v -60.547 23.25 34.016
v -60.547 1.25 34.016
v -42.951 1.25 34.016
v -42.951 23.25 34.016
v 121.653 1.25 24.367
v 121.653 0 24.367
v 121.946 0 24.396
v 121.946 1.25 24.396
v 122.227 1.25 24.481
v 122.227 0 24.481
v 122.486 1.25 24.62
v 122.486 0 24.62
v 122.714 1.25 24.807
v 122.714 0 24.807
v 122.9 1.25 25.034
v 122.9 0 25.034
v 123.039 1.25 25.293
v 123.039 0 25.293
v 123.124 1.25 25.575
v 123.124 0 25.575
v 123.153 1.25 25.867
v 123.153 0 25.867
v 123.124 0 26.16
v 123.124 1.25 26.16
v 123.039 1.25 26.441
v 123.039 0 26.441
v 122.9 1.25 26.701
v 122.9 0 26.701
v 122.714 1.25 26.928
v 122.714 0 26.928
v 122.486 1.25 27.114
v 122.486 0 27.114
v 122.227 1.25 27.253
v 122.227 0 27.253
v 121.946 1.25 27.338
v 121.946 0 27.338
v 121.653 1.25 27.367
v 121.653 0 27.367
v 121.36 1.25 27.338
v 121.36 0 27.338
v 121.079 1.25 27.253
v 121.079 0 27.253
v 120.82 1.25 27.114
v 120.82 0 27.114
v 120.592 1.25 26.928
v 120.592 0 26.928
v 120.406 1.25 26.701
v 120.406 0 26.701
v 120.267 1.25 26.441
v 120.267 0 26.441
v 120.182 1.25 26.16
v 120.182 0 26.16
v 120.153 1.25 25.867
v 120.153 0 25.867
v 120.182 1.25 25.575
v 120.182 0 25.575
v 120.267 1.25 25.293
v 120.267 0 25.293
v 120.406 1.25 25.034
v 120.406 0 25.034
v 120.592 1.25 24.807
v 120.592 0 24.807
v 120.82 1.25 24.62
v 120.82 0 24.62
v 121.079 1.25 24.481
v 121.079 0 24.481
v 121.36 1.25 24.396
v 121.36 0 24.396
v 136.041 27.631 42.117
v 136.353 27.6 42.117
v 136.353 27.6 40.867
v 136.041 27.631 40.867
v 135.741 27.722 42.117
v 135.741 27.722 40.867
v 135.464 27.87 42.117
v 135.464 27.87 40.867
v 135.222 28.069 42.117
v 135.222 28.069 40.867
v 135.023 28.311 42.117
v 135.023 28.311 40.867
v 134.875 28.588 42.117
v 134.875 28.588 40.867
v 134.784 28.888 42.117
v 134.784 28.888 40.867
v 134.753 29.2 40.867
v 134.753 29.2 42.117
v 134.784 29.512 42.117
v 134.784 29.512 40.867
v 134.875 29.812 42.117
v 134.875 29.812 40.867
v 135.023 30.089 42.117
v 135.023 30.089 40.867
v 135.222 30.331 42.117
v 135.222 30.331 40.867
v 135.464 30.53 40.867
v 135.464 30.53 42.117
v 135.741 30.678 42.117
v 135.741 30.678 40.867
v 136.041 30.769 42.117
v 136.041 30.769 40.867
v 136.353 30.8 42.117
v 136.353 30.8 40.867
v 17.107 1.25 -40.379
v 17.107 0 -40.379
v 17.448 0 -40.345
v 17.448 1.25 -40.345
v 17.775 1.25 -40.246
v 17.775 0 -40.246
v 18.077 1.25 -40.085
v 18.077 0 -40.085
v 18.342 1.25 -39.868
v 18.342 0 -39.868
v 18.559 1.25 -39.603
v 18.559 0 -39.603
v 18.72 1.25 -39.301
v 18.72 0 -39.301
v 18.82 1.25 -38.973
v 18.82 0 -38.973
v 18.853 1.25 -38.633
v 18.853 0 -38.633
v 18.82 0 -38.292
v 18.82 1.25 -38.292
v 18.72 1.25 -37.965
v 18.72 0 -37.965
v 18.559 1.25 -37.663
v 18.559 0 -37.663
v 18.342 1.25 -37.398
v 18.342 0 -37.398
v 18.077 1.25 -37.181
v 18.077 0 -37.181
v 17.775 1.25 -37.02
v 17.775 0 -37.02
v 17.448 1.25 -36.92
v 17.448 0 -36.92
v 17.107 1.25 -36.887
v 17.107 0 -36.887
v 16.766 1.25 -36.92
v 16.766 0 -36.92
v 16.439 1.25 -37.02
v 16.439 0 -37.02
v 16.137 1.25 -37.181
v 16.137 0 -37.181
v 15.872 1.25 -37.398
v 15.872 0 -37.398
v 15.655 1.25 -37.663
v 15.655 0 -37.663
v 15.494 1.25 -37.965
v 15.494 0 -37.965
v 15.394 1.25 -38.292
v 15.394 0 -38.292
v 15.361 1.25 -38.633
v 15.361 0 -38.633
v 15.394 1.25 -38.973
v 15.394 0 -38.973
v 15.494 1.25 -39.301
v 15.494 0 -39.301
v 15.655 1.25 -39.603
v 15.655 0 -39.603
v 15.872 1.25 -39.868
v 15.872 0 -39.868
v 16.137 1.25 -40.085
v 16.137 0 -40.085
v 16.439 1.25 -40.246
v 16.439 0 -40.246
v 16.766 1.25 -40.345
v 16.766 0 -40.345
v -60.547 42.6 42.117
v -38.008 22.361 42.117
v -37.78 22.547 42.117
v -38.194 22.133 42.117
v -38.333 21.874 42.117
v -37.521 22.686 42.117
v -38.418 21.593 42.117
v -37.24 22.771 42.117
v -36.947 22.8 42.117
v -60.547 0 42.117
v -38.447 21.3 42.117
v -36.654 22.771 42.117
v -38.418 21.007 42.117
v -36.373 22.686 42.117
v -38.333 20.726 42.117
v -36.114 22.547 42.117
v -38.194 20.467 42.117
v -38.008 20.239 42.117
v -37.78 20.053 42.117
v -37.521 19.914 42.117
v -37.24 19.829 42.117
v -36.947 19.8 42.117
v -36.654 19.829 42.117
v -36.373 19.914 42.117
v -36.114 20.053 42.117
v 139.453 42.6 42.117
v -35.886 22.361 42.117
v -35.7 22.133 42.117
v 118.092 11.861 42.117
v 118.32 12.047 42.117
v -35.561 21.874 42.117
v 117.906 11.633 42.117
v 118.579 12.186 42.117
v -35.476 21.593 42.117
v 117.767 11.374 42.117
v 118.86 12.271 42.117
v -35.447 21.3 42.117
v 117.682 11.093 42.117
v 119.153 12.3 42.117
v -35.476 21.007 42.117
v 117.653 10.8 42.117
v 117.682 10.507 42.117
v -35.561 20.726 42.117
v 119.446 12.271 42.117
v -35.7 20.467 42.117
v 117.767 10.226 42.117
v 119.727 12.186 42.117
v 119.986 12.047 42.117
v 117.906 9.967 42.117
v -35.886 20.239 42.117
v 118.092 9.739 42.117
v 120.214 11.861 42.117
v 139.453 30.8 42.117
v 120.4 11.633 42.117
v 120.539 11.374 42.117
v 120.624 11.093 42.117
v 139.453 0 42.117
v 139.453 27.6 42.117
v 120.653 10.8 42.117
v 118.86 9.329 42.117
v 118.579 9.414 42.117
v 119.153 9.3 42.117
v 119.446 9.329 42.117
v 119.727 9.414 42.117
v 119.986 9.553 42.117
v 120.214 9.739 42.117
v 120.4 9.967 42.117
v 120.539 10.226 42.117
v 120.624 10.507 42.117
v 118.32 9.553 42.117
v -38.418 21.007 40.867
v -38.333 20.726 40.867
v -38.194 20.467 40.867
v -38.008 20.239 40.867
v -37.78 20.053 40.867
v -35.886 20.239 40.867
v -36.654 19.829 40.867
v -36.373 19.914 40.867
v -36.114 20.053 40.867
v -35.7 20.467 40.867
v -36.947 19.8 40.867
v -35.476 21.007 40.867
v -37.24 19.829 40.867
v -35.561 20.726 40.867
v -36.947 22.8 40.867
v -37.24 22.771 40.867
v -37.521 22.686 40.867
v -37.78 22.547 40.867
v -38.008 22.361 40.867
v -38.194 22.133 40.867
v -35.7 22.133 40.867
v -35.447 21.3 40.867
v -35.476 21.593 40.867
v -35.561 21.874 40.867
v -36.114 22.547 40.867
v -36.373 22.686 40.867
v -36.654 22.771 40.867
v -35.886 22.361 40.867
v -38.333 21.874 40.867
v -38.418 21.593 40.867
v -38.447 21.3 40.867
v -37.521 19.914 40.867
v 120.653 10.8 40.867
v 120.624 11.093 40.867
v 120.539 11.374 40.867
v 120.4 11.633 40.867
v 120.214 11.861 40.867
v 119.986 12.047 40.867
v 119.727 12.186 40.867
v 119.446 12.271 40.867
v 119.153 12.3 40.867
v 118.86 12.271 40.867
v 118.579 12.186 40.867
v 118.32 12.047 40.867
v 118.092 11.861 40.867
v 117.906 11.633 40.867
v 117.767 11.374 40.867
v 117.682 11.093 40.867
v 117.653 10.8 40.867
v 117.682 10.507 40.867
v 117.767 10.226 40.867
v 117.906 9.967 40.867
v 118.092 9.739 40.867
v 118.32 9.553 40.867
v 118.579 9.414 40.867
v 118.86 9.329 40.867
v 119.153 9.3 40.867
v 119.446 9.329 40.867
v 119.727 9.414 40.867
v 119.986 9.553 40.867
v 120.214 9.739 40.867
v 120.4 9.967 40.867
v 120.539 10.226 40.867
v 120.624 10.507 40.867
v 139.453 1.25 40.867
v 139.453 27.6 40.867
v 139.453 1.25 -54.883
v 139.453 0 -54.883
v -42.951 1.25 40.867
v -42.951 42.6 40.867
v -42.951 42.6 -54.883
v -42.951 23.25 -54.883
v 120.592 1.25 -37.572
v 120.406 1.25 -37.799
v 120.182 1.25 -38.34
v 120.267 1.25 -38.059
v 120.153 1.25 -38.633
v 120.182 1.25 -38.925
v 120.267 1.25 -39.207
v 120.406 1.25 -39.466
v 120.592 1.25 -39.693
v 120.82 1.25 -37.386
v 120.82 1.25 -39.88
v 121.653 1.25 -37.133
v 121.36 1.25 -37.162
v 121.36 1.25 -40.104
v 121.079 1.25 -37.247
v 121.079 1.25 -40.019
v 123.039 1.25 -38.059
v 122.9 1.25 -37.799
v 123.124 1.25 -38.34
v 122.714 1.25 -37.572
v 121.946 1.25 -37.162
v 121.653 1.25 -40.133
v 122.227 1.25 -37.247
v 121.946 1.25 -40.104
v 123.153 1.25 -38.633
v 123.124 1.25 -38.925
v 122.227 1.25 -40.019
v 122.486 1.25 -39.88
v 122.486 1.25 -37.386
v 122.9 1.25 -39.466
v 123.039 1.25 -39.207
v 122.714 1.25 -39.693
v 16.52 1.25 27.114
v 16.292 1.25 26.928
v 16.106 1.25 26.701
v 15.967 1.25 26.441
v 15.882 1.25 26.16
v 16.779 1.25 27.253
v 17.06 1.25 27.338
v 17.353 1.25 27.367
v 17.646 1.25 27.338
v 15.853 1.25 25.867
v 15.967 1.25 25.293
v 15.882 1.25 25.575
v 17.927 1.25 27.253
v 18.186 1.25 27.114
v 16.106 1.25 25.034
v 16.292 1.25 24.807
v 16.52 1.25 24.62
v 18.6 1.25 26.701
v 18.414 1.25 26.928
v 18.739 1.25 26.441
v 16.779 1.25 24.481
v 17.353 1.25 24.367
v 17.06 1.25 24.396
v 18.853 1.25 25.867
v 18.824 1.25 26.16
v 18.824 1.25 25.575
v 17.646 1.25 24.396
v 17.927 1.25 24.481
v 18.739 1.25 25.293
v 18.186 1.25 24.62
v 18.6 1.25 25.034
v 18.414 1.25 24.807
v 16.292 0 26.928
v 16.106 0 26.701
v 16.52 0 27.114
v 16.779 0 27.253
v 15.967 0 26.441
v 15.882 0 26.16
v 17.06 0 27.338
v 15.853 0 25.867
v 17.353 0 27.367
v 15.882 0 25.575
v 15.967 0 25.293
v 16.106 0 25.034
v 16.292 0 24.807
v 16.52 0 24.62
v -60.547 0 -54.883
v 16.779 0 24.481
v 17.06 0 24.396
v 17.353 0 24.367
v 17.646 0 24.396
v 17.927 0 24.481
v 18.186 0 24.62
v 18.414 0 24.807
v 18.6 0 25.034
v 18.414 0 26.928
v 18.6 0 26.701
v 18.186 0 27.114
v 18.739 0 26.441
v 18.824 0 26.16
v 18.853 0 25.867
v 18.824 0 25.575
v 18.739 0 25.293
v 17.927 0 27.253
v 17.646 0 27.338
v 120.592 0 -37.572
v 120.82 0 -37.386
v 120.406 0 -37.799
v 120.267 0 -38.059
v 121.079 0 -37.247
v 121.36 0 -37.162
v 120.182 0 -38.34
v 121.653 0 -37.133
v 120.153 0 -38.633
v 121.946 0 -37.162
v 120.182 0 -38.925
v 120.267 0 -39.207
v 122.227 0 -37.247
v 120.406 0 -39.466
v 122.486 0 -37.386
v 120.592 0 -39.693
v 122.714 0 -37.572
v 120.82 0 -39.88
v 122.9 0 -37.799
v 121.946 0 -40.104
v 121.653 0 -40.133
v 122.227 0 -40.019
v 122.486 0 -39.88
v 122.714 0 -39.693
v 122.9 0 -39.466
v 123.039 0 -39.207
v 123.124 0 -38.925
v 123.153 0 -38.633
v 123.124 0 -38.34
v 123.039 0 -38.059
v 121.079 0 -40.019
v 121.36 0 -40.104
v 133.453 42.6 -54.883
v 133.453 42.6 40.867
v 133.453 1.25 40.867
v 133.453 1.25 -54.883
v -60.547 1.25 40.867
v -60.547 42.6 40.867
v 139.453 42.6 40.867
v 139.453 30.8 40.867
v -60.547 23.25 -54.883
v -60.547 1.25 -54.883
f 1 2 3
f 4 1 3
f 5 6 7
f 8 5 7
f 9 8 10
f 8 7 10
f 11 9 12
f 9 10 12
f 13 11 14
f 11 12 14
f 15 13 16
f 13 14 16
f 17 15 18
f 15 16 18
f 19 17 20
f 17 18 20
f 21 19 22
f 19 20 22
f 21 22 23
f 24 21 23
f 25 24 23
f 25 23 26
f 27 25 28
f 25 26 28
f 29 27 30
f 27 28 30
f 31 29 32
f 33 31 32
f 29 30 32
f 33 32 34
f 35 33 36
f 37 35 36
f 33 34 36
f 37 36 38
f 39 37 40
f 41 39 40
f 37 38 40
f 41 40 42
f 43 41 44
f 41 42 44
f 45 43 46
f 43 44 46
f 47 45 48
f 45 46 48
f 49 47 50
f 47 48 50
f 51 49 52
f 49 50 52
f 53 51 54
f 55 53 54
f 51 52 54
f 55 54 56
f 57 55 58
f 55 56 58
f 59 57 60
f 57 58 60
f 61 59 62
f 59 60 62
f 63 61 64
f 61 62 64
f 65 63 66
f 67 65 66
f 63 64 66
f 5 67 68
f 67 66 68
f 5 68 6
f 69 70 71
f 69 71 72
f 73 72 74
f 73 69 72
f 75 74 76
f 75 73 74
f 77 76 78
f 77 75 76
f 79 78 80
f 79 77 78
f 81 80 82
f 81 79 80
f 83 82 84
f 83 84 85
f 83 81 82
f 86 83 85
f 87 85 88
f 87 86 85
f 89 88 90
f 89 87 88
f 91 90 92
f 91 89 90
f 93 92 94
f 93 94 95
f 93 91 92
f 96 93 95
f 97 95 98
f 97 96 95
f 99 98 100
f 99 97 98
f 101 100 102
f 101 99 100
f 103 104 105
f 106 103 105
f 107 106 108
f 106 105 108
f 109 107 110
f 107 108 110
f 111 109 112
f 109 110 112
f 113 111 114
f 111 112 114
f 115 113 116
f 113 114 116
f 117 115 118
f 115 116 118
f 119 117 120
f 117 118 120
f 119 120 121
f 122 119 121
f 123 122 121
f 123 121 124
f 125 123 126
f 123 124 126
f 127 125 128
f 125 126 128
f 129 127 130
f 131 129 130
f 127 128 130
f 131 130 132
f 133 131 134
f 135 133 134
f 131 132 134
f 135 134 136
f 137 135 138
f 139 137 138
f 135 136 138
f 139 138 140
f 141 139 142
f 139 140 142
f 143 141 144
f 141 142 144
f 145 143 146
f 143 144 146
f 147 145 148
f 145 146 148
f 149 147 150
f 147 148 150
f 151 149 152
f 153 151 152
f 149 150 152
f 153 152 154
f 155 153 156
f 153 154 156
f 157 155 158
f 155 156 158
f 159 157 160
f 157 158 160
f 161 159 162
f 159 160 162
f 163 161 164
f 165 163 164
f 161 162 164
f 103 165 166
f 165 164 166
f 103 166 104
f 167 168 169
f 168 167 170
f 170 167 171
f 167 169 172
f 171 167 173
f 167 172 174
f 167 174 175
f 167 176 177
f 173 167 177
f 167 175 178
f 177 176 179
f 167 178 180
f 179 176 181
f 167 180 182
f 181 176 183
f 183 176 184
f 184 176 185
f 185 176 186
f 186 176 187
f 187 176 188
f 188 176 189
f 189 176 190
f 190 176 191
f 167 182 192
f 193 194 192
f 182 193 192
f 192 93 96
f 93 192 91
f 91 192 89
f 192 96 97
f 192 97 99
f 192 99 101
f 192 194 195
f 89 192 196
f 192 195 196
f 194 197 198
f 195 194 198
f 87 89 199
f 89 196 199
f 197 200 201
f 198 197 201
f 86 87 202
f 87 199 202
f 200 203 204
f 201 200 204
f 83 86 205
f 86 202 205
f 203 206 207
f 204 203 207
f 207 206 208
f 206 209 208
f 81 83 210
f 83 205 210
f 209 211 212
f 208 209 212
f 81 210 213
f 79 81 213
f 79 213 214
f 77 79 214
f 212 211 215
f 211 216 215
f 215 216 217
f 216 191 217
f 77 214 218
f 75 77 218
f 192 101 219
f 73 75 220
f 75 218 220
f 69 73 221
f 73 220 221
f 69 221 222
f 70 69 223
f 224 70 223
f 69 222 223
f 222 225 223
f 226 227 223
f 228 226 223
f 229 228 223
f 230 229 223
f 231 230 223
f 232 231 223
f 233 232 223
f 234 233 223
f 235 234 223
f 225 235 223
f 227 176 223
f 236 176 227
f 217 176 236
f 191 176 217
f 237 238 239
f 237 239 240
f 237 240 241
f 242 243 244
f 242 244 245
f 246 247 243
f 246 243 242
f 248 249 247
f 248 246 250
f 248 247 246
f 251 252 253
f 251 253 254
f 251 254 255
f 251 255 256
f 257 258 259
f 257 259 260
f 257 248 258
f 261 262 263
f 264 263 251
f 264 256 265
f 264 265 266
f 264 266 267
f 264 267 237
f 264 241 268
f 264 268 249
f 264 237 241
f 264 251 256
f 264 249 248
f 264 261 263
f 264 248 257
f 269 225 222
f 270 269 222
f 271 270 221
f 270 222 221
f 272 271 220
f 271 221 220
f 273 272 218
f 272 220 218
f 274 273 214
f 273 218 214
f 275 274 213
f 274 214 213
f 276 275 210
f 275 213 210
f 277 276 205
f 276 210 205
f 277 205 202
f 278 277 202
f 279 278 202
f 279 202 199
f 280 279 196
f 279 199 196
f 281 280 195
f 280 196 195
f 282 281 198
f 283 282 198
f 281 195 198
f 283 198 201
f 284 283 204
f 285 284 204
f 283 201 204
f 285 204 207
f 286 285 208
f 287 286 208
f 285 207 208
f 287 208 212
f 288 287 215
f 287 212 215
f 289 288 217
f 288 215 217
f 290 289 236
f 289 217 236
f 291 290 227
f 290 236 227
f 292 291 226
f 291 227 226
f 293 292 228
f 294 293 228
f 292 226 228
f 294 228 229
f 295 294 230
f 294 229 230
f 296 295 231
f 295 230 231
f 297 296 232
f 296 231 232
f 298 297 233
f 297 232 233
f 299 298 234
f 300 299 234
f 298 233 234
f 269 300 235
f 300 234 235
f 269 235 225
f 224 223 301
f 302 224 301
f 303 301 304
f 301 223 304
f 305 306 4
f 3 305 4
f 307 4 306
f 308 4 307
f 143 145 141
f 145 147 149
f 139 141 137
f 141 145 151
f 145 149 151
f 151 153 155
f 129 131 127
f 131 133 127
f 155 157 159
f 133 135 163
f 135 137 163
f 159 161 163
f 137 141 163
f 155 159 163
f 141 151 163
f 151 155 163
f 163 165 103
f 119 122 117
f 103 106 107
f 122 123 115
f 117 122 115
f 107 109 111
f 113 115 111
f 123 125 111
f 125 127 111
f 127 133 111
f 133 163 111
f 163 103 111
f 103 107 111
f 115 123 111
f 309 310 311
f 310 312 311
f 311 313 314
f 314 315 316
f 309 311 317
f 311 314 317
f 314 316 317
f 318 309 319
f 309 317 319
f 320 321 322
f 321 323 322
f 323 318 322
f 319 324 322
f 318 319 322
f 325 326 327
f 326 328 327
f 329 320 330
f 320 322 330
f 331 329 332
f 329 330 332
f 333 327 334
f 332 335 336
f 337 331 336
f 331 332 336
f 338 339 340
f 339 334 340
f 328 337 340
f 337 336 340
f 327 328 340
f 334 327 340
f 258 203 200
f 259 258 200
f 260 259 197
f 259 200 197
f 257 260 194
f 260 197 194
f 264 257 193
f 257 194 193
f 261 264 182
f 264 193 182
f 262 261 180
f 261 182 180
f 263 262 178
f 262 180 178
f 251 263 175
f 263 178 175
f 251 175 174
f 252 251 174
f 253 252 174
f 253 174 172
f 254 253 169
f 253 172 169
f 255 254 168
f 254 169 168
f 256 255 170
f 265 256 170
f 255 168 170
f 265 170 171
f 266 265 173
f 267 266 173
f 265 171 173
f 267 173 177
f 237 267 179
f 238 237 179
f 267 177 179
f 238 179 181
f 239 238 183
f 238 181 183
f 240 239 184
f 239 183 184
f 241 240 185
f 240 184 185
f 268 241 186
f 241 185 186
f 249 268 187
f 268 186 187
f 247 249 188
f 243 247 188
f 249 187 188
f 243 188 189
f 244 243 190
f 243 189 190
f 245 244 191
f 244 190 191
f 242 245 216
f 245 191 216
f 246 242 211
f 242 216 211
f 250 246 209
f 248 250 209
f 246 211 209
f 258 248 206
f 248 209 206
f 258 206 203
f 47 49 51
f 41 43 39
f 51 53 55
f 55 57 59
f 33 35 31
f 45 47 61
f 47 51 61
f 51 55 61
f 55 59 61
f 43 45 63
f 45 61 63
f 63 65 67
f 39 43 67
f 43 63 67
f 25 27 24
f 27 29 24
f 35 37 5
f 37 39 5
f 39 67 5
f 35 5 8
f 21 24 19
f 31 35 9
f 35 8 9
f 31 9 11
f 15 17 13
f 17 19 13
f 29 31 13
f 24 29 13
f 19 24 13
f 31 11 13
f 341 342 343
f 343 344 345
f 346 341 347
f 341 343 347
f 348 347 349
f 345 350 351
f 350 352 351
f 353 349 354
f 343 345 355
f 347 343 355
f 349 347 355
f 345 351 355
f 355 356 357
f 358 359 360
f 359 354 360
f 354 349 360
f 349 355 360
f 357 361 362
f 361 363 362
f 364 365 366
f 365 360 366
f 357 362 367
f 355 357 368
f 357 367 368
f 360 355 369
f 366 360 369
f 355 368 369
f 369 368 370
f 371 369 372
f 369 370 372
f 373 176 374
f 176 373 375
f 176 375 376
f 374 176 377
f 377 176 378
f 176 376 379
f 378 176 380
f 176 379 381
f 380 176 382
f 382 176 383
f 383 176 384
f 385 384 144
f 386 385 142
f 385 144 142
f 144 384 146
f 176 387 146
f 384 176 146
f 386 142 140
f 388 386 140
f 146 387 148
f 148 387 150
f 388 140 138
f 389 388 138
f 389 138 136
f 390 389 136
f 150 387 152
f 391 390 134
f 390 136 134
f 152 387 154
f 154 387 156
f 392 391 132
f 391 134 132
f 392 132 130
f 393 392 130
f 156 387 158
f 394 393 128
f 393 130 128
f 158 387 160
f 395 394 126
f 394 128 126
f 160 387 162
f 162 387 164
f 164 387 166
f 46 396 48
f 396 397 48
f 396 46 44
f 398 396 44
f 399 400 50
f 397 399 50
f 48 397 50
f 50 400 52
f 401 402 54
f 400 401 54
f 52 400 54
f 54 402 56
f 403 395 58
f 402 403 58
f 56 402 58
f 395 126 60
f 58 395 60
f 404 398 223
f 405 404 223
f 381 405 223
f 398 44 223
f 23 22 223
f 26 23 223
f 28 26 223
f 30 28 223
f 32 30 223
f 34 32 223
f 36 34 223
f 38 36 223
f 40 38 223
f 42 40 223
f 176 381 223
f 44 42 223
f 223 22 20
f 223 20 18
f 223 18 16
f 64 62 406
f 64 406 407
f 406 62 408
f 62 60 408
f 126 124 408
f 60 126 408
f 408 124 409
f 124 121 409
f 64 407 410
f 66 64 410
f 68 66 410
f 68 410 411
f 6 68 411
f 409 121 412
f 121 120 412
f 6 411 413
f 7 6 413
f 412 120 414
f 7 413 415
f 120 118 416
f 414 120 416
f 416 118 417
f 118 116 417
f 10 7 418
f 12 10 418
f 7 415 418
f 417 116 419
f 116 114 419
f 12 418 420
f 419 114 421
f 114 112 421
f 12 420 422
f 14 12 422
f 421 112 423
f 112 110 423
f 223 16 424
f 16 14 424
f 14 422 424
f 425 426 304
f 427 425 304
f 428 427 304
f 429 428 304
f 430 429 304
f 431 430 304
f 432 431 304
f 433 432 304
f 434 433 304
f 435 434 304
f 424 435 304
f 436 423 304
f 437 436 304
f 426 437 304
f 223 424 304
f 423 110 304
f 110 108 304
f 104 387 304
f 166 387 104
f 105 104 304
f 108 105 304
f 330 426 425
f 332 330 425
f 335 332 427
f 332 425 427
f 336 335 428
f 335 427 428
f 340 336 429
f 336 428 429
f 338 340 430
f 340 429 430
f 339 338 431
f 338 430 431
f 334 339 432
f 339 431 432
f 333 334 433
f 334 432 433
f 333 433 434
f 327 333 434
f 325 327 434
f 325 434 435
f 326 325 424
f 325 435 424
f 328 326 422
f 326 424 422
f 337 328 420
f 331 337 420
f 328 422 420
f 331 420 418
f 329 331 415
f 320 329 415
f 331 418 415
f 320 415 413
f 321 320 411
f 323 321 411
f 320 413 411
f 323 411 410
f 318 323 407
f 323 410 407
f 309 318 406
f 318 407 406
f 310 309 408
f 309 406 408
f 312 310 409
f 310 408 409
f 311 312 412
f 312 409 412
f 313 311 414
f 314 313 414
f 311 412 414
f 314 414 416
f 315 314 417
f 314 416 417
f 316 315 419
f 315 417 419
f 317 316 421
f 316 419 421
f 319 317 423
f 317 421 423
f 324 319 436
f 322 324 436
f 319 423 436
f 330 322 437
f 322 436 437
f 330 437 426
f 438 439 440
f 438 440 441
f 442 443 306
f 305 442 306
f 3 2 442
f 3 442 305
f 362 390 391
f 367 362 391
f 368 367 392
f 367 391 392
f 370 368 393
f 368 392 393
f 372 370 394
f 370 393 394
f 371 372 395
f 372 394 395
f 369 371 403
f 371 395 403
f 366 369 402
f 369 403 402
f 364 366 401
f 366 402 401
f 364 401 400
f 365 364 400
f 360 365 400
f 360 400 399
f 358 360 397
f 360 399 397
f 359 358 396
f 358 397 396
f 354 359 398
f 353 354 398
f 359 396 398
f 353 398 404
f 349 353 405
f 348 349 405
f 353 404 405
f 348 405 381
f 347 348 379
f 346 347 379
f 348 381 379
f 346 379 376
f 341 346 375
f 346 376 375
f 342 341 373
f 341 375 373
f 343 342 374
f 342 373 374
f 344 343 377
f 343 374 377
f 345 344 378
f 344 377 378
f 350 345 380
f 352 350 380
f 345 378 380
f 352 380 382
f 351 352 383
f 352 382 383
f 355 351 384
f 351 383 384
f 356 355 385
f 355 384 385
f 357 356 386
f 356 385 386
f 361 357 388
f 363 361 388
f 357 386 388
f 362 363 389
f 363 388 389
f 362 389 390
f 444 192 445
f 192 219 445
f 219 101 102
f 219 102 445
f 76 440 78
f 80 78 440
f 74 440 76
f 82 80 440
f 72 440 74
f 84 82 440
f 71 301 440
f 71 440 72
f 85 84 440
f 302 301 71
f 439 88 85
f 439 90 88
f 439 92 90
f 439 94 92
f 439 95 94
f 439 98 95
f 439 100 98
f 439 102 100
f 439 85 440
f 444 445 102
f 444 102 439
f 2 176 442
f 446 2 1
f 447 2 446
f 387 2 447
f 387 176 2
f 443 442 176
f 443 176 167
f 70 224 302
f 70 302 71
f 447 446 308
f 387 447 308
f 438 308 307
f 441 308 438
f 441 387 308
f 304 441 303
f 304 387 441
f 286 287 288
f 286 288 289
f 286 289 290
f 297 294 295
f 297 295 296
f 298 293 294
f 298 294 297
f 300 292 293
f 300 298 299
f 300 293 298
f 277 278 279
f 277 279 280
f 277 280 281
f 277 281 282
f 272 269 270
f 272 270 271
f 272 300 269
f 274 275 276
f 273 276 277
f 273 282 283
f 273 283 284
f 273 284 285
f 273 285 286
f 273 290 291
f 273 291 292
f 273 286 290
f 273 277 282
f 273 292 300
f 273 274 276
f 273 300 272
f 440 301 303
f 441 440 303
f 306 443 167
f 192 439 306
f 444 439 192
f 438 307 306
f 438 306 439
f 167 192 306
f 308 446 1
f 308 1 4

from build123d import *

# Parameters (mm, degrees)
SZKIC1_W                    = 200
SZKIC1_H                    = 97
DODANIE_WYCI_GNI_CIE1_DEPTH = 1.25
SZKIC2_W                    = 200
SZKIC2_H                    = 1.25
DODANIE_WYCI_GNI_CIE2_DEPTH = 42.6
SZKIC4_R                    = 1.5
SZKIC4_R_2                  = 1.746235722
WYTNIJ_WYCI_GNI_CIE1_DEPTH  = 1.25
SZKIC5_W                    = 182.404557989
SZKIC5_H                    = 95.75
DODANIE_WYCI_GNI_CIE3_DEPTH = 41.35
SZKIC6_W                    = 17.595442011
SZKIC6_H                    = 88.898428246
DODANIE_WYCI_GNI_CIE4_DEPTH = 22
SZKIC3_R                    = 1.5
WYTNIJ_WYCI_GNI_CIE2_DEPTH  = 1.25
SZKIC7_W                    = 95.75
SZKIC7_H                    = 41.35
WYTNIJ_WYCI_GNI_CIE3_DEPTH  = 6


with BuildPart() as part:
    # Szkic1 → Dodanie-wyciągnięcie1 (new body)
    with BuildSketch(Plane(origin=(0, 0, 0), x_dir=(1, 0, 0), z_dir=(0, 1, 0))):
        with Locations((39.453125, 6.3828125)):
            Rectangle(SZKIC1_W, SZKIC1_H)
    extrude(amount=DODANIE_WYCI_GNI_CIE1_DEPTH)

    # Szkic2 → Dodanie-wyciągnięcie2 (add)
    with BuildSketch(Plane.XZ):
        with Locations((39.453125, 41.4921875)):
            Rectangle(SZKIC2_W, SZKIC2_H)
    extrude(amount=-DODANIE_WYCI_GNI_CIE2_DEPTH)

    # Szkic4 → Wytnij-wyciągnięcie1 (cut)
    with BuildSketch(Plane.XZ):
        with Locations(Location((121.653125, -38.6328125, 0), (0, 0, 270))):
            Circle(SZKIC4_R)
        with Locations(Location((121.653125, 25.8671875, 0), (0, 0, 270))):
            Circle(SZKIC4_R)
        with Locations(Location((17.106889278, -38.6328125, 0), (0, 0, 270))):
            Circle(SZKIC4_R_2)
        with Locations(Location((17.353125, 25.8671875, 0), (0, 0, 270))):
            Circle(SZKIC4_R)
    extrude(amount=-WYTNIJ_WYCI_GNI_CIE1_DEPTH, mode=Mode.SUBTRACT)

    # Szkic5 → Dodanie-wyciągnięcie3 (add)
    with BuildSketch(Plane(origin=(0, 1.25, 0), x_dir=(1, 0, 0), z_dir=(0, 1, 0))):
        with Locations((48.250846005, 7.0078125)):
            Rectangle(SZKIC5_W, SZKIC5_H)
    extrude(amount=DODANIE_WYCI_GNI_CIE3_DEPTH)

    # Szkic6 → Dodanie-wyciągnięcie4 (add)
    with BuildSketch(Plane(origin=(0, 1.25, 0), x_dir=(1, 0, 0), z_dir=(0, 1, 0))):
        with Locations((-51.749153995, 10.433598377)):
            Rectangle(SZKIC6_W, SZKIC6_H)
    extrude(amount=DODANIE_WYCI_GNI_CIE4_DEPTH)

    # Szkic3 → Wytnij-wyciągnięcie2 (cut)
    with BuildSketch(Plane.XY.offset(42.1171875)):
        with Locations((119.153125, 10.8)):
            Circle(SZKIC3_R)
        with Locations((-36.946875, 21.3)):
            Circle(SZKIC3_R)
        with BuildLine():
            Line((136.353125, 30.8), (139.453125, 30.8))
            Line((139.453125, 30.8), (139.453125, 27.6))
            Line((139.453125, 27.6), (136.353125, 27.6))
            ThreePointArc((136.353125, 27.6), (134.753125, 29.2), (136.353125, 30.8))
        make_face()
    extrude(amount=-WYTNIJ_WYCI_GNI_CIE2_DEPTH, mode=Mode.SUBTRACT)

    # Szkic7 → Wytnij-wyciągnięcie3 (cut)
    with BuildSketch(Plane(origin=(139.453125, 0, 0), x_dir=(0, 0, -1), z_dir=(1, 0, 0))):
        with Locations((7.0078125, 21.925)):
            Rectangle(SZKIC7_W, SZKIC7_H)
    extrude(amount=-WYTNIJ_WYCI_GNI_CIE3_DEPTH, mode=Mode.SUBTRACT)


solid = part.part
